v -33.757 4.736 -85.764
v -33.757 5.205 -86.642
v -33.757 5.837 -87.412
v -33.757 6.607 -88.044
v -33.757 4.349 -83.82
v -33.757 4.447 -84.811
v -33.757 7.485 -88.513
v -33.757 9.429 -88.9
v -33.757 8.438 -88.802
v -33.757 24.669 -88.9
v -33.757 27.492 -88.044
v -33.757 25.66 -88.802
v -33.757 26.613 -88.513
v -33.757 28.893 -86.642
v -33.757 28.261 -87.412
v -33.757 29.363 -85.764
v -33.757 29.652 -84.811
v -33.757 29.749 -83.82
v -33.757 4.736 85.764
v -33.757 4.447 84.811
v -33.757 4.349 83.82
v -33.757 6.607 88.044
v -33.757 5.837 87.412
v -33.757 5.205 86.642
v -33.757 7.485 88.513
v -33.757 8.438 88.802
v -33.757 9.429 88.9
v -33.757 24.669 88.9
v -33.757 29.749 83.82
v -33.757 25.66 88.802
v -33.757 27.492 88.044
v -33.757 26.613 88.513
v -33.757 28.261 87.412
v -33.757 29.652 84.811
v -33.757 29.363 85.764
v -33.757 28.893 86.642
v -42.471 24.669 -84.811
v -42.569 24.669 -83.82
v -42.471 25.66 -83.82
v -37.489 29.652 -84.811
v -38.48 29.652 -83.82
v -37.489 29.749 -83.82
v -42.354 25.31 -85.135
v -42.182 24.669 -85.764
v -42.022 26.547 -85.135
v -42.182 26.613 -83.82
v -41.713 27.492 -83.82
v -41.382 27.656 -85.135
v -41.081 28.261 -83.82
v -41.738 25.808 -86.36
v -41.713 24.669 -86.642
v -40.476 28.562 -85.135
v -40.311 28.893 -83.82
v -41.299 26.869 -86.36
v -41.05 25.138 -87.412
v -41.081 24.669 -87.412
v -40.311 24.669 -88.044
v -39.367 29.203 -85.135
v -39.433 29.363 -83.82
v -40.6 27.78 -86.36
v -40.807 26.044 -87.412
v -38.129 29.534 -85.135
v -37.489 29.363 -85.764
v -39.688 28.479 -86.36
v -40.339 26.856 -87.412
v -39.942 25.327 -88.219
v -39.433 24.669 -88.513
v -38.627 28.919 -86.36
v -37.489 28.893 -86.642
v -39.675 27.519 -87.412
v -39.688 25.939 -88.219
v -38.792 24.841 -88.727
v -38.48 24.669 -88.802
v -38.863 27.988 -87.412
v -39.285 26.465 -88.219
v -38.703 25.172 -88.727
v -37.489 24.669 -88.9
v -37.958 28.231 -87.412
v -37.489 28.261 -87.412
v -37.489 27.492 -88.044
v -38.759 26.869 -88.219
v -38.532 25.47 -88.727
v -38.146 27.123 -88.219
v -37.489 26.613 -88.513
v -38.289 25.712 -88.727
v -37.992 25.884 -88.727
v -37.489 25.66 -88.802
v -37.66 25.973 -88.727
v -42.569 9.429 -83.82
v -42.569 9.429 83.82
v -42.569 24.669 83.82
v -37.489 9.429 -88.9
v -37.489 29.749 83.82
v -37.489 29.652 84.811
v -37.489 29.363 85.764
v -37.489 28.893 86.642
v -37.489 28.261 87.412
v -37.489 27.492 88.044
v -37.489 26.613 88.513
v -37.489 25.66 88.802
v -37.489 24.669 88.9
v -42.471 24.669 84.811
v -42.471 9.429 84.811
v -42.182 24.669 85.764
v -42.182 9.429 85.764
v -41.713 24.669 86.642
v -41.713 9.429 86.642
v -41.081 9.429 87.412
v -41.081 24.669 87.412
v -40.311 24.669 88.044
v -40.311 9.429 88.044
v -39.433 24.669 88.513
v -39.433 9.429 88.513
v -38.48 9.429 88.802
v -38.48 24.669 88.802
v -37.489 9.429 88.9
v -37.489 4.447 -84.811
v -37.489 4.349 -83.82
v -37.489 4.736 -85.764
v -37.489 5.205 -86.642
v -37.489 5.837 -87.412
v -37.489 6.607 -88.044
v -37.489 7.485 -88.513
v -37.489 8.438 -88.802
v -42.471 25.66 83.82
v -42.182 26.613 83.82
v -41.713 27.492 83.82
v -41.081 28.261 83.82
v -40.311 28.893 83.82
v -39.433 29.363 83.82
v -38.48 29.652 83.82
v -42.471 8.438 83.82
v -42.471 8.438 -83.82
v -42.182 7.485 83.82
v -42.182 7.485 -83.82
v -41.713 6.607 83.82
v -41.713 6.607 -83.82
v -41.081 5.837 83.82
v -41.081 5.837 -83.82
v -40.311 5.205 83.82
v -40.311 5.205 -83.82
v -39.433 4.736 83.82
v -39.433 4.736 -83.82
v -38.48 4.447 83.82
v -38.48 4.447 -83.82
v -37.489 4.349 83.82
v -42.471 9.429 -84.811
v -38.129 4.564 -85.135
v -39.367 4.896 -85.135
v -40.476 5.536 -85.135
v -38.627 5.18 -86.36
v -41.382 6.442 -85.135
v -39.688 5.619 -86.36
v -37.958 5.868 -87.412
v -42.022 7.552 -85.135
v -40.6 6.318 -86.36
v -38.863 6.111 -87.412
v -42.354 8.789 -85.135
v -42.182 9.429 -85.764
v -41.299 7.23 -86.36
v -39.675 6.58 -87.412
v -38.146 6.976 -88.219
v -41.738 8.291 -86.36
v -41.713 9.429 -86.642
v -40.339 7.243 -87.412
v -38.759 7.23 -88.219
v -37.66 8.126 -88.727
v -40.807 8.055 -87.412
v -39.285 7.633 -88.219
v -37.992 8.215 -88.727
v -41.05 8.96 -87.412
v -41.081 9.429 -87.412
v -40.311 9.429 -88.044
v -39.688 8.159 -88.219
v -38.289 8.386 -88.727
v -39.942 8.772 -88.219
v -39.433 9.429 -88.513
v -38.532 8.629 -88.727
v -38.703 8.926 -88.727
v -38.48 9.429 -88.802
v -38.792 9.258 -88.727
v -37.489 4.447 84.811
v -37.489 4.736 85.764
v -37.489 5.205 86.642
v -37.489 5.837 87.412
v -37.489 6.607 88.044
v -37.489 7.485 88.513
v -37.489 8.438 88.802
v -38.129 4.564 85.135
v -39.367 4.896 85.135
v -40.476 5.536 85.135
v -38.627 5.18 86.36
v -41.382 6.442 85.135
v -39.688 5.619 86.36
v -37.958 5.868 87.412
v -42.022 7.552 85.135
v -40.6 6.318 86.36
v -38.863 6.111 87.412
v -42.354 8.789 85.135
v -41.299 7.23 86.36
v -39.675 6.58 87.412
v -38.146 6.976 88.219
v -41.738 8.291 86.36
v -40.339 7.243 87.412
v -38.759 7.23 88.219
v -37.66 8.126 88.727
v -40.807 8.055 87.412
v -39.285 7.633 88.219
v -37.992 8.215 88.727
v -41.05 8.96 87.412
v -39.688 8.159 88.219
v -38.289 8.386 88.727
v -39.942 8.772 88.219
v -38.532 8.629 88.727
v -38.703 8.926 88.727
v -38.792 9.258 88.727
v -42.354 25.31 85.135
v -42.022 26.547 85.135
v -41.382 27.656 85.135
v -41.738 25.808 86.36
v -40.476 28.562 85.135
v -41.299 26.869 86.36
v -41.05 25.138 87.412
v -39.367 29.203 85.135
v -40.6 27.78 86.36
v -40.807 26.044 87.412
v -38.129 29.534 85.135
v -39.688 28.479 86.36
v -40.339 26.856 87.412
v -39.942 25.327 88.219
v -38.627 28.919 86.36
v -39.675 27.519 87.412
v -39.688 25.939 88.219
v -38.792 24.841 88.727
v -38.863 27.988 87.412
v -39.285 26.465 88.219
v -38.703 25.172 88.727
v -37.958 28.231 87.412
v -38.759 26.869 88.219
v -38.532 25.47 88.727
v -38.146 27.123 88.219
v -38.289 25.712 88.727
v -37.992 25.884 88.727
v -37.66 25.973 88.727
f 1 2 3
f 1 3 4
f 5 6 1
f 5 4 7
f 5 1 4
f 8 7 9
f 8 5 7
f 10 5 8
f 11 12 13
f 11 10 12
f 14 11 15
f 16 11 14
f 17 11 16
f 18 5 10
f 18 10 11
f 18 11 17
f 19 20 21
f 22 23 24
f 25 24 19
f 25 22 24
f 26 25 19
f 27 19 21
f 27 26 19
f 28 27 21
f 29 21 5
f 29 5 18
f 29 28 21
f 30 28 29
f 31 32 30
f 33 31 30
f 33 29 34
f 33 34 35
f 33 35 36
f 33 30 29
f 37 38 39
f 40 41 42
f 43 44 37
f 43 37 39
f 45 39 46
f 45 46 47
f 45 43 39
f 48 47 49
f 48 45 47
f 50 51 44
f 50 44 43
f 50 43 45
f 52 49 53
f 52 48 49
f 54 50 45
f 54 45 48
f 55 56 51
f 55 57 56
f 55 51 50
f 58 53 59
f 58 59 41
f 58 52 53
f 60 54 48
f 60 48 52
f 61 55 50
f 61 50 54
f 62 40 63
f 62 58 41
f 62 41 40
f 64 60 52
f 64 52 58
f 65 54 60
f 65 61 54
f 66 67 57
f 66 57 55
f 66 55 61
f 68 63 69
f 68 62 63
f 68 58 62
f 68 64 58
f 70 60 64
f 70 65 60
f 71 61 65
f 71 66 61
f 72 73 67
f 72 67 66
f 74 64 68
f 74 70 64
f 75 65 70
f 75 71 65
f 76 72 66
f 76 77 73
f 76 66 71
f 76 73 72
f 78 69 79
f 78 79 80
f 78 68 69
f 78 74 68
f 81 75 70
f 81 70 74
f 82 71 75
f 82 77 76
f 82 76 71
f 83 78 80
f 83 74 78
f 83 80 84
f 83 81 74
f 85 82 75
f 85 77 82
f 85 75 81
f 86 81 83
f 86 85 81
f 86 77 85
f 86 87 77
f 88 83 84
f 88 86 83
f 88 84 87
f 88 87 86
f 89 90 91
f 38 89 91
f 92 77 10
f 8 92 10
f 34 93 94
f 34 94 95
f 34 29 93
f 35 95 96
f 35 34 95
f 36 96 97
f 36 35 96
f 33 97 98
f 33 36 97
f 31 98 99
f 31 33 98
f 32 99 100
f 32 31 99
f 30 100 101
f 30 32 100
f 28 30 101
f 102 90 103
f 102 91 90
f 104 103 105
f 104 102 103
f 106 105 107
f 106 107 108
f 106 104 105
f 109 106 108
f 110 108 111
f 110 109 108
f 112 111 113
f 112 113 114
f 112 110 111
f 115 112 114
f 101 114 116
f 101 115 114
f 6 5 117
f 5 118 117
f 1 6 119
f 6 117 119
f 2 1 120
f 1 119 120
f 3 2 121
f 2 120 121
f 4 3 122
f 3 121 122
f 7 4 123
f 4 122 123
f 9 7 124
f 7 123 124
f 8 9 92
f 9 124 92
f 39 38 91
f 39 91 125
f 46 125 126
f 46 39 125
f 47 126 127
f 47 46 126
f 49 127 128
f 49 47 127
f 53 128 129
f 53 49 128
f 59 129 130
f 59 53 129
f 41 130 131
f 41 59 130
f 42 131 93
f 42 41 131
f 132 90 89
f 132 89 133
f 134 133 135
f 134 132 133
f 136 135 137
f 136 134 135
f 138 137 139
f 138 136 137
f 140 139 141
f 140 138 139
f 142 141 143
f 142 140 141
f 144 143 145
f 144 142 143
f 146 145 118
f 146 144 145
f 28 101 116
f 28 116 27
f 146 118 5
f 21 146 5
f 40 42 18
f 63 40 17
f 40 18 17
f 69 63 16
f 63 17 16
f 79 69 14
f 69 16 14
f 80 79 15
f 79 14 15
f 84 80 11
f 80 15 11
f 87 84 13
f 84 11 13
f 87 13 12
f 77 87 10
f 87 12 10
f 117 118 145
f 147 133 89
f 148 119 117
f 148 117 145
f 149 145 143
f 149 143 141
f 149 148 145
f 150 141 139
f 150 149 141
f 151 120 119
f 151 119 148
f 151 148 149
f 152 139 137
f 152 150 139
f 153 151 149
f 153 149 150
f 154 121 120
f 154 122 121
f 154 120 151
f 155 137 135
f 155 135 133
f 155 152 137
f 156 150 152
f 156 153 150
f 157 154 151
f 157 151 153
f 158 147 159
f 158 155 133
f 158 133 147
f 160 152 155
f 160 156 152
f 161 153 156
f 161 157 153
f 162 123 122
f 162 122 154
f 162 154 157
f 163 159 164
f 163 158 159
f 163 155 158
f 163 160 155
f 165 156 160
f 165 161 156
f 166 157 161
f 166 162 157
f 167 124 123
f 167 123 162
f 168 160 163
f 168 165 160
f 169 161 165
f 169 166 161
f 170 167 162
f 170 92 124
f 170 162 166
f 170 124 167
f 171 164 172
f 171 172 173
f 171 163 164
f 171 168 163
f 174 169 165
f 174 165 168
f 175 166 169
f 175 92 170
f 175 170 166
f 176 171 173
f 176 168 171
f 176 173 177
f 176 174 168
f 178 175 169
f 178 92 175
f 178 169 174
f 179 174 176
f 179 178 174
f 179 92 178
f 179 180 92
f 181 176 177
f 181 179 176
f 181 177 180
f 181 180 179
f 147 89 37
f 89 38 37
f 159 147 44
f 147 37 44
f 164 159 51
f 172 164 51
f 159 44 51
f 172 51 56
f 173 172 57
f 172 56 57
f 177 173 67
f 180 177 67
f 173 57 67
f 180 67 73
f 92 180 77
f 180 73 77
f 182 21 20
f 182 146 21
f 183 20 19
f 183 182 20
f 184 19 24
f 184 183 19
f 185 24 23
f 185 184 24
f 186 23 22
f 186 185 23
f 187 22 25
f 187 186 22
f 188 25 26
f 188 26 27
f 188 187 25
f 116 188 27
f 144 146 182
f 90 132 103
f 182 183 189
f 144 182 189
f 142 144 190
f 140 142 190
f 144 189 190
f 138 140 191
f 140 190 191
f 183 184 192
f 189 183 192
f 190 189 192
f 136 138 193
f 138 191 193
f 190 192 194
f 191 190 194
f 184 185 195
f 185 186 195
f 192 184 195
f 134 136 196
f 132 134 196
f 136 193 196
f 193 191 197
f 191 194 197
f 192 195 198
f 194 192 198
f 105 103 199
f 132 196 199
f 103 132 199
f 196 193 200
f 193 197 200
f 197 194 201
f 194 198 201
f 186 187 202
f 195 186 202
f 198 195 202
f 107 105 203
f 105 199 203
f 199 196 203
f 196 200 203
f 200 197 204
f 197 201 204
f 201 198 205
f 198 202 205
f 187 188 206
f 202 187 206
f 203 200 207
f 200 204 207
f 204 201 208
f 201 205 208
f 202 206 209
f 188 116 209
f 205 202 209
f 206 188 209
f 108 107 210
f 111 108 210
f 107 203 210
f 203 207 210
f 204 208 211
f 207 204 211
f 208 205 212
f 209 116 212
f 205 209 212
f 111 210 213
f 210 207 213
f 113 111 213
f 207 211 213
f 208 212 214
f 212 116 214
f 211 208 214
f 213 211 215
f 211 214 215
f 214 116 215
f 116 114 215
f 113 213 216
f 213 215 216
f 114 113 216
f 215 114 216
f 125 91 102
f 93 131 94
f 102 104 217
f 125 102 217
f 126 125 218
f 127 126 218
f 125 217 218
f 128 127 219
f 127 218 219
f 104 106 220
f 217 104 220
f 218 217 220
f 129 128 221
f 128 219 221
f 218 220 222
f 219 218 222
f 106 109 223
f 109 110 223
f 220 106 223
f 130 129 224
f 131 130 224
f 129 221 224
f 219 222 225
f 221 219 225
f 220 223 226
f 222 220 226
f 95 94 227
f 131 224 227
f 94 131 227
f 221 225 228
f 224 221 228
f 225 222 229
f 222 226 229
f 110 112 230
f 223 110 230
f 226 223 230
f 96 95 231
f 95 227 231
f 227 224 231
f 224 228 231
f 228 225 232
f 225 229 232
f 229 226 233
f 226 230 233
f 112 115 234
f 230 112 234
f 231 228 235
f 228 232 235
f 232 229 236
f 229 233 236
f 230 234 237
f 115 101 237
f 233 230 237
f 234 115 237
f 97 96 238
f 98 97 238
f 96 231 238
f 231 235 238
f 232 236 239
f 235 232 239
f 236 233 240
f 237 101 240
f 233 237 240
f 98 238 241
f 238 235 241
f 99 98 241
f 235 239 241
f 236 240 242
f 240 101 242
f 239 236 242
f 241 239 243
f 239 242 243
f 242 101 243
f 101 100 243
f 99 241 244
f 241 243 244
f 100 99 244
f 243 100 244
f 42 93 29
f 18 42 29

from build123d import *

# Parameters (mm, degrees)
F0_W          = 8.812238
F0_H          = 25.4
F1_DEPTH      = 88.9
F1_DEPTH_BACK = 88.9
F2_R          = 5.08
F3_R          = 5.08
F4_R          = 5.08
F5_R          = 5.08


with BuildPart() as f1:
    # F0 (on Top) → F1 (new body, two sides)
    with BuildSketch(Plane.XY) as f1_sk:
        with Locations((-38.162628, 17.049316)):
            Rectangle(F0_W, F0_H)
    extrude(amount=F1_DEPTH)
    extrude(f1_sk.sketch, amount=-F1_DEPTH_BACK)

    # F2
    f2_edges = [f1.edges().sort_by_distance(p)[0] for p in [
        (-42.568747, 4.349316, 0),
    ]]
    fillet(f2_edges, radius=F2_R)

    # F3
    f3_edges = [f1.edges().sort_by_distance(p)[0] for p in [
        (-42.568747, 29.749316, 0),
    ]]
    fillet(f3_edges, radius=F3_R)

    # F4
    f4_edges = [f1.edges().sort_by_distance(p)[0] for p in [
        (-42.568747, 17.049316, 88.9),
    ]]
    fillet(f4_edges, radius=F4_R)

    # F5
    f5_edges = [f1.edges().sort_by_distance(p)[0] for p in [
        (-42.568747, 17.049316, -88.9),
    ]]
    fillet(f5_edges, radius=F5_R)


solid = f1.part
